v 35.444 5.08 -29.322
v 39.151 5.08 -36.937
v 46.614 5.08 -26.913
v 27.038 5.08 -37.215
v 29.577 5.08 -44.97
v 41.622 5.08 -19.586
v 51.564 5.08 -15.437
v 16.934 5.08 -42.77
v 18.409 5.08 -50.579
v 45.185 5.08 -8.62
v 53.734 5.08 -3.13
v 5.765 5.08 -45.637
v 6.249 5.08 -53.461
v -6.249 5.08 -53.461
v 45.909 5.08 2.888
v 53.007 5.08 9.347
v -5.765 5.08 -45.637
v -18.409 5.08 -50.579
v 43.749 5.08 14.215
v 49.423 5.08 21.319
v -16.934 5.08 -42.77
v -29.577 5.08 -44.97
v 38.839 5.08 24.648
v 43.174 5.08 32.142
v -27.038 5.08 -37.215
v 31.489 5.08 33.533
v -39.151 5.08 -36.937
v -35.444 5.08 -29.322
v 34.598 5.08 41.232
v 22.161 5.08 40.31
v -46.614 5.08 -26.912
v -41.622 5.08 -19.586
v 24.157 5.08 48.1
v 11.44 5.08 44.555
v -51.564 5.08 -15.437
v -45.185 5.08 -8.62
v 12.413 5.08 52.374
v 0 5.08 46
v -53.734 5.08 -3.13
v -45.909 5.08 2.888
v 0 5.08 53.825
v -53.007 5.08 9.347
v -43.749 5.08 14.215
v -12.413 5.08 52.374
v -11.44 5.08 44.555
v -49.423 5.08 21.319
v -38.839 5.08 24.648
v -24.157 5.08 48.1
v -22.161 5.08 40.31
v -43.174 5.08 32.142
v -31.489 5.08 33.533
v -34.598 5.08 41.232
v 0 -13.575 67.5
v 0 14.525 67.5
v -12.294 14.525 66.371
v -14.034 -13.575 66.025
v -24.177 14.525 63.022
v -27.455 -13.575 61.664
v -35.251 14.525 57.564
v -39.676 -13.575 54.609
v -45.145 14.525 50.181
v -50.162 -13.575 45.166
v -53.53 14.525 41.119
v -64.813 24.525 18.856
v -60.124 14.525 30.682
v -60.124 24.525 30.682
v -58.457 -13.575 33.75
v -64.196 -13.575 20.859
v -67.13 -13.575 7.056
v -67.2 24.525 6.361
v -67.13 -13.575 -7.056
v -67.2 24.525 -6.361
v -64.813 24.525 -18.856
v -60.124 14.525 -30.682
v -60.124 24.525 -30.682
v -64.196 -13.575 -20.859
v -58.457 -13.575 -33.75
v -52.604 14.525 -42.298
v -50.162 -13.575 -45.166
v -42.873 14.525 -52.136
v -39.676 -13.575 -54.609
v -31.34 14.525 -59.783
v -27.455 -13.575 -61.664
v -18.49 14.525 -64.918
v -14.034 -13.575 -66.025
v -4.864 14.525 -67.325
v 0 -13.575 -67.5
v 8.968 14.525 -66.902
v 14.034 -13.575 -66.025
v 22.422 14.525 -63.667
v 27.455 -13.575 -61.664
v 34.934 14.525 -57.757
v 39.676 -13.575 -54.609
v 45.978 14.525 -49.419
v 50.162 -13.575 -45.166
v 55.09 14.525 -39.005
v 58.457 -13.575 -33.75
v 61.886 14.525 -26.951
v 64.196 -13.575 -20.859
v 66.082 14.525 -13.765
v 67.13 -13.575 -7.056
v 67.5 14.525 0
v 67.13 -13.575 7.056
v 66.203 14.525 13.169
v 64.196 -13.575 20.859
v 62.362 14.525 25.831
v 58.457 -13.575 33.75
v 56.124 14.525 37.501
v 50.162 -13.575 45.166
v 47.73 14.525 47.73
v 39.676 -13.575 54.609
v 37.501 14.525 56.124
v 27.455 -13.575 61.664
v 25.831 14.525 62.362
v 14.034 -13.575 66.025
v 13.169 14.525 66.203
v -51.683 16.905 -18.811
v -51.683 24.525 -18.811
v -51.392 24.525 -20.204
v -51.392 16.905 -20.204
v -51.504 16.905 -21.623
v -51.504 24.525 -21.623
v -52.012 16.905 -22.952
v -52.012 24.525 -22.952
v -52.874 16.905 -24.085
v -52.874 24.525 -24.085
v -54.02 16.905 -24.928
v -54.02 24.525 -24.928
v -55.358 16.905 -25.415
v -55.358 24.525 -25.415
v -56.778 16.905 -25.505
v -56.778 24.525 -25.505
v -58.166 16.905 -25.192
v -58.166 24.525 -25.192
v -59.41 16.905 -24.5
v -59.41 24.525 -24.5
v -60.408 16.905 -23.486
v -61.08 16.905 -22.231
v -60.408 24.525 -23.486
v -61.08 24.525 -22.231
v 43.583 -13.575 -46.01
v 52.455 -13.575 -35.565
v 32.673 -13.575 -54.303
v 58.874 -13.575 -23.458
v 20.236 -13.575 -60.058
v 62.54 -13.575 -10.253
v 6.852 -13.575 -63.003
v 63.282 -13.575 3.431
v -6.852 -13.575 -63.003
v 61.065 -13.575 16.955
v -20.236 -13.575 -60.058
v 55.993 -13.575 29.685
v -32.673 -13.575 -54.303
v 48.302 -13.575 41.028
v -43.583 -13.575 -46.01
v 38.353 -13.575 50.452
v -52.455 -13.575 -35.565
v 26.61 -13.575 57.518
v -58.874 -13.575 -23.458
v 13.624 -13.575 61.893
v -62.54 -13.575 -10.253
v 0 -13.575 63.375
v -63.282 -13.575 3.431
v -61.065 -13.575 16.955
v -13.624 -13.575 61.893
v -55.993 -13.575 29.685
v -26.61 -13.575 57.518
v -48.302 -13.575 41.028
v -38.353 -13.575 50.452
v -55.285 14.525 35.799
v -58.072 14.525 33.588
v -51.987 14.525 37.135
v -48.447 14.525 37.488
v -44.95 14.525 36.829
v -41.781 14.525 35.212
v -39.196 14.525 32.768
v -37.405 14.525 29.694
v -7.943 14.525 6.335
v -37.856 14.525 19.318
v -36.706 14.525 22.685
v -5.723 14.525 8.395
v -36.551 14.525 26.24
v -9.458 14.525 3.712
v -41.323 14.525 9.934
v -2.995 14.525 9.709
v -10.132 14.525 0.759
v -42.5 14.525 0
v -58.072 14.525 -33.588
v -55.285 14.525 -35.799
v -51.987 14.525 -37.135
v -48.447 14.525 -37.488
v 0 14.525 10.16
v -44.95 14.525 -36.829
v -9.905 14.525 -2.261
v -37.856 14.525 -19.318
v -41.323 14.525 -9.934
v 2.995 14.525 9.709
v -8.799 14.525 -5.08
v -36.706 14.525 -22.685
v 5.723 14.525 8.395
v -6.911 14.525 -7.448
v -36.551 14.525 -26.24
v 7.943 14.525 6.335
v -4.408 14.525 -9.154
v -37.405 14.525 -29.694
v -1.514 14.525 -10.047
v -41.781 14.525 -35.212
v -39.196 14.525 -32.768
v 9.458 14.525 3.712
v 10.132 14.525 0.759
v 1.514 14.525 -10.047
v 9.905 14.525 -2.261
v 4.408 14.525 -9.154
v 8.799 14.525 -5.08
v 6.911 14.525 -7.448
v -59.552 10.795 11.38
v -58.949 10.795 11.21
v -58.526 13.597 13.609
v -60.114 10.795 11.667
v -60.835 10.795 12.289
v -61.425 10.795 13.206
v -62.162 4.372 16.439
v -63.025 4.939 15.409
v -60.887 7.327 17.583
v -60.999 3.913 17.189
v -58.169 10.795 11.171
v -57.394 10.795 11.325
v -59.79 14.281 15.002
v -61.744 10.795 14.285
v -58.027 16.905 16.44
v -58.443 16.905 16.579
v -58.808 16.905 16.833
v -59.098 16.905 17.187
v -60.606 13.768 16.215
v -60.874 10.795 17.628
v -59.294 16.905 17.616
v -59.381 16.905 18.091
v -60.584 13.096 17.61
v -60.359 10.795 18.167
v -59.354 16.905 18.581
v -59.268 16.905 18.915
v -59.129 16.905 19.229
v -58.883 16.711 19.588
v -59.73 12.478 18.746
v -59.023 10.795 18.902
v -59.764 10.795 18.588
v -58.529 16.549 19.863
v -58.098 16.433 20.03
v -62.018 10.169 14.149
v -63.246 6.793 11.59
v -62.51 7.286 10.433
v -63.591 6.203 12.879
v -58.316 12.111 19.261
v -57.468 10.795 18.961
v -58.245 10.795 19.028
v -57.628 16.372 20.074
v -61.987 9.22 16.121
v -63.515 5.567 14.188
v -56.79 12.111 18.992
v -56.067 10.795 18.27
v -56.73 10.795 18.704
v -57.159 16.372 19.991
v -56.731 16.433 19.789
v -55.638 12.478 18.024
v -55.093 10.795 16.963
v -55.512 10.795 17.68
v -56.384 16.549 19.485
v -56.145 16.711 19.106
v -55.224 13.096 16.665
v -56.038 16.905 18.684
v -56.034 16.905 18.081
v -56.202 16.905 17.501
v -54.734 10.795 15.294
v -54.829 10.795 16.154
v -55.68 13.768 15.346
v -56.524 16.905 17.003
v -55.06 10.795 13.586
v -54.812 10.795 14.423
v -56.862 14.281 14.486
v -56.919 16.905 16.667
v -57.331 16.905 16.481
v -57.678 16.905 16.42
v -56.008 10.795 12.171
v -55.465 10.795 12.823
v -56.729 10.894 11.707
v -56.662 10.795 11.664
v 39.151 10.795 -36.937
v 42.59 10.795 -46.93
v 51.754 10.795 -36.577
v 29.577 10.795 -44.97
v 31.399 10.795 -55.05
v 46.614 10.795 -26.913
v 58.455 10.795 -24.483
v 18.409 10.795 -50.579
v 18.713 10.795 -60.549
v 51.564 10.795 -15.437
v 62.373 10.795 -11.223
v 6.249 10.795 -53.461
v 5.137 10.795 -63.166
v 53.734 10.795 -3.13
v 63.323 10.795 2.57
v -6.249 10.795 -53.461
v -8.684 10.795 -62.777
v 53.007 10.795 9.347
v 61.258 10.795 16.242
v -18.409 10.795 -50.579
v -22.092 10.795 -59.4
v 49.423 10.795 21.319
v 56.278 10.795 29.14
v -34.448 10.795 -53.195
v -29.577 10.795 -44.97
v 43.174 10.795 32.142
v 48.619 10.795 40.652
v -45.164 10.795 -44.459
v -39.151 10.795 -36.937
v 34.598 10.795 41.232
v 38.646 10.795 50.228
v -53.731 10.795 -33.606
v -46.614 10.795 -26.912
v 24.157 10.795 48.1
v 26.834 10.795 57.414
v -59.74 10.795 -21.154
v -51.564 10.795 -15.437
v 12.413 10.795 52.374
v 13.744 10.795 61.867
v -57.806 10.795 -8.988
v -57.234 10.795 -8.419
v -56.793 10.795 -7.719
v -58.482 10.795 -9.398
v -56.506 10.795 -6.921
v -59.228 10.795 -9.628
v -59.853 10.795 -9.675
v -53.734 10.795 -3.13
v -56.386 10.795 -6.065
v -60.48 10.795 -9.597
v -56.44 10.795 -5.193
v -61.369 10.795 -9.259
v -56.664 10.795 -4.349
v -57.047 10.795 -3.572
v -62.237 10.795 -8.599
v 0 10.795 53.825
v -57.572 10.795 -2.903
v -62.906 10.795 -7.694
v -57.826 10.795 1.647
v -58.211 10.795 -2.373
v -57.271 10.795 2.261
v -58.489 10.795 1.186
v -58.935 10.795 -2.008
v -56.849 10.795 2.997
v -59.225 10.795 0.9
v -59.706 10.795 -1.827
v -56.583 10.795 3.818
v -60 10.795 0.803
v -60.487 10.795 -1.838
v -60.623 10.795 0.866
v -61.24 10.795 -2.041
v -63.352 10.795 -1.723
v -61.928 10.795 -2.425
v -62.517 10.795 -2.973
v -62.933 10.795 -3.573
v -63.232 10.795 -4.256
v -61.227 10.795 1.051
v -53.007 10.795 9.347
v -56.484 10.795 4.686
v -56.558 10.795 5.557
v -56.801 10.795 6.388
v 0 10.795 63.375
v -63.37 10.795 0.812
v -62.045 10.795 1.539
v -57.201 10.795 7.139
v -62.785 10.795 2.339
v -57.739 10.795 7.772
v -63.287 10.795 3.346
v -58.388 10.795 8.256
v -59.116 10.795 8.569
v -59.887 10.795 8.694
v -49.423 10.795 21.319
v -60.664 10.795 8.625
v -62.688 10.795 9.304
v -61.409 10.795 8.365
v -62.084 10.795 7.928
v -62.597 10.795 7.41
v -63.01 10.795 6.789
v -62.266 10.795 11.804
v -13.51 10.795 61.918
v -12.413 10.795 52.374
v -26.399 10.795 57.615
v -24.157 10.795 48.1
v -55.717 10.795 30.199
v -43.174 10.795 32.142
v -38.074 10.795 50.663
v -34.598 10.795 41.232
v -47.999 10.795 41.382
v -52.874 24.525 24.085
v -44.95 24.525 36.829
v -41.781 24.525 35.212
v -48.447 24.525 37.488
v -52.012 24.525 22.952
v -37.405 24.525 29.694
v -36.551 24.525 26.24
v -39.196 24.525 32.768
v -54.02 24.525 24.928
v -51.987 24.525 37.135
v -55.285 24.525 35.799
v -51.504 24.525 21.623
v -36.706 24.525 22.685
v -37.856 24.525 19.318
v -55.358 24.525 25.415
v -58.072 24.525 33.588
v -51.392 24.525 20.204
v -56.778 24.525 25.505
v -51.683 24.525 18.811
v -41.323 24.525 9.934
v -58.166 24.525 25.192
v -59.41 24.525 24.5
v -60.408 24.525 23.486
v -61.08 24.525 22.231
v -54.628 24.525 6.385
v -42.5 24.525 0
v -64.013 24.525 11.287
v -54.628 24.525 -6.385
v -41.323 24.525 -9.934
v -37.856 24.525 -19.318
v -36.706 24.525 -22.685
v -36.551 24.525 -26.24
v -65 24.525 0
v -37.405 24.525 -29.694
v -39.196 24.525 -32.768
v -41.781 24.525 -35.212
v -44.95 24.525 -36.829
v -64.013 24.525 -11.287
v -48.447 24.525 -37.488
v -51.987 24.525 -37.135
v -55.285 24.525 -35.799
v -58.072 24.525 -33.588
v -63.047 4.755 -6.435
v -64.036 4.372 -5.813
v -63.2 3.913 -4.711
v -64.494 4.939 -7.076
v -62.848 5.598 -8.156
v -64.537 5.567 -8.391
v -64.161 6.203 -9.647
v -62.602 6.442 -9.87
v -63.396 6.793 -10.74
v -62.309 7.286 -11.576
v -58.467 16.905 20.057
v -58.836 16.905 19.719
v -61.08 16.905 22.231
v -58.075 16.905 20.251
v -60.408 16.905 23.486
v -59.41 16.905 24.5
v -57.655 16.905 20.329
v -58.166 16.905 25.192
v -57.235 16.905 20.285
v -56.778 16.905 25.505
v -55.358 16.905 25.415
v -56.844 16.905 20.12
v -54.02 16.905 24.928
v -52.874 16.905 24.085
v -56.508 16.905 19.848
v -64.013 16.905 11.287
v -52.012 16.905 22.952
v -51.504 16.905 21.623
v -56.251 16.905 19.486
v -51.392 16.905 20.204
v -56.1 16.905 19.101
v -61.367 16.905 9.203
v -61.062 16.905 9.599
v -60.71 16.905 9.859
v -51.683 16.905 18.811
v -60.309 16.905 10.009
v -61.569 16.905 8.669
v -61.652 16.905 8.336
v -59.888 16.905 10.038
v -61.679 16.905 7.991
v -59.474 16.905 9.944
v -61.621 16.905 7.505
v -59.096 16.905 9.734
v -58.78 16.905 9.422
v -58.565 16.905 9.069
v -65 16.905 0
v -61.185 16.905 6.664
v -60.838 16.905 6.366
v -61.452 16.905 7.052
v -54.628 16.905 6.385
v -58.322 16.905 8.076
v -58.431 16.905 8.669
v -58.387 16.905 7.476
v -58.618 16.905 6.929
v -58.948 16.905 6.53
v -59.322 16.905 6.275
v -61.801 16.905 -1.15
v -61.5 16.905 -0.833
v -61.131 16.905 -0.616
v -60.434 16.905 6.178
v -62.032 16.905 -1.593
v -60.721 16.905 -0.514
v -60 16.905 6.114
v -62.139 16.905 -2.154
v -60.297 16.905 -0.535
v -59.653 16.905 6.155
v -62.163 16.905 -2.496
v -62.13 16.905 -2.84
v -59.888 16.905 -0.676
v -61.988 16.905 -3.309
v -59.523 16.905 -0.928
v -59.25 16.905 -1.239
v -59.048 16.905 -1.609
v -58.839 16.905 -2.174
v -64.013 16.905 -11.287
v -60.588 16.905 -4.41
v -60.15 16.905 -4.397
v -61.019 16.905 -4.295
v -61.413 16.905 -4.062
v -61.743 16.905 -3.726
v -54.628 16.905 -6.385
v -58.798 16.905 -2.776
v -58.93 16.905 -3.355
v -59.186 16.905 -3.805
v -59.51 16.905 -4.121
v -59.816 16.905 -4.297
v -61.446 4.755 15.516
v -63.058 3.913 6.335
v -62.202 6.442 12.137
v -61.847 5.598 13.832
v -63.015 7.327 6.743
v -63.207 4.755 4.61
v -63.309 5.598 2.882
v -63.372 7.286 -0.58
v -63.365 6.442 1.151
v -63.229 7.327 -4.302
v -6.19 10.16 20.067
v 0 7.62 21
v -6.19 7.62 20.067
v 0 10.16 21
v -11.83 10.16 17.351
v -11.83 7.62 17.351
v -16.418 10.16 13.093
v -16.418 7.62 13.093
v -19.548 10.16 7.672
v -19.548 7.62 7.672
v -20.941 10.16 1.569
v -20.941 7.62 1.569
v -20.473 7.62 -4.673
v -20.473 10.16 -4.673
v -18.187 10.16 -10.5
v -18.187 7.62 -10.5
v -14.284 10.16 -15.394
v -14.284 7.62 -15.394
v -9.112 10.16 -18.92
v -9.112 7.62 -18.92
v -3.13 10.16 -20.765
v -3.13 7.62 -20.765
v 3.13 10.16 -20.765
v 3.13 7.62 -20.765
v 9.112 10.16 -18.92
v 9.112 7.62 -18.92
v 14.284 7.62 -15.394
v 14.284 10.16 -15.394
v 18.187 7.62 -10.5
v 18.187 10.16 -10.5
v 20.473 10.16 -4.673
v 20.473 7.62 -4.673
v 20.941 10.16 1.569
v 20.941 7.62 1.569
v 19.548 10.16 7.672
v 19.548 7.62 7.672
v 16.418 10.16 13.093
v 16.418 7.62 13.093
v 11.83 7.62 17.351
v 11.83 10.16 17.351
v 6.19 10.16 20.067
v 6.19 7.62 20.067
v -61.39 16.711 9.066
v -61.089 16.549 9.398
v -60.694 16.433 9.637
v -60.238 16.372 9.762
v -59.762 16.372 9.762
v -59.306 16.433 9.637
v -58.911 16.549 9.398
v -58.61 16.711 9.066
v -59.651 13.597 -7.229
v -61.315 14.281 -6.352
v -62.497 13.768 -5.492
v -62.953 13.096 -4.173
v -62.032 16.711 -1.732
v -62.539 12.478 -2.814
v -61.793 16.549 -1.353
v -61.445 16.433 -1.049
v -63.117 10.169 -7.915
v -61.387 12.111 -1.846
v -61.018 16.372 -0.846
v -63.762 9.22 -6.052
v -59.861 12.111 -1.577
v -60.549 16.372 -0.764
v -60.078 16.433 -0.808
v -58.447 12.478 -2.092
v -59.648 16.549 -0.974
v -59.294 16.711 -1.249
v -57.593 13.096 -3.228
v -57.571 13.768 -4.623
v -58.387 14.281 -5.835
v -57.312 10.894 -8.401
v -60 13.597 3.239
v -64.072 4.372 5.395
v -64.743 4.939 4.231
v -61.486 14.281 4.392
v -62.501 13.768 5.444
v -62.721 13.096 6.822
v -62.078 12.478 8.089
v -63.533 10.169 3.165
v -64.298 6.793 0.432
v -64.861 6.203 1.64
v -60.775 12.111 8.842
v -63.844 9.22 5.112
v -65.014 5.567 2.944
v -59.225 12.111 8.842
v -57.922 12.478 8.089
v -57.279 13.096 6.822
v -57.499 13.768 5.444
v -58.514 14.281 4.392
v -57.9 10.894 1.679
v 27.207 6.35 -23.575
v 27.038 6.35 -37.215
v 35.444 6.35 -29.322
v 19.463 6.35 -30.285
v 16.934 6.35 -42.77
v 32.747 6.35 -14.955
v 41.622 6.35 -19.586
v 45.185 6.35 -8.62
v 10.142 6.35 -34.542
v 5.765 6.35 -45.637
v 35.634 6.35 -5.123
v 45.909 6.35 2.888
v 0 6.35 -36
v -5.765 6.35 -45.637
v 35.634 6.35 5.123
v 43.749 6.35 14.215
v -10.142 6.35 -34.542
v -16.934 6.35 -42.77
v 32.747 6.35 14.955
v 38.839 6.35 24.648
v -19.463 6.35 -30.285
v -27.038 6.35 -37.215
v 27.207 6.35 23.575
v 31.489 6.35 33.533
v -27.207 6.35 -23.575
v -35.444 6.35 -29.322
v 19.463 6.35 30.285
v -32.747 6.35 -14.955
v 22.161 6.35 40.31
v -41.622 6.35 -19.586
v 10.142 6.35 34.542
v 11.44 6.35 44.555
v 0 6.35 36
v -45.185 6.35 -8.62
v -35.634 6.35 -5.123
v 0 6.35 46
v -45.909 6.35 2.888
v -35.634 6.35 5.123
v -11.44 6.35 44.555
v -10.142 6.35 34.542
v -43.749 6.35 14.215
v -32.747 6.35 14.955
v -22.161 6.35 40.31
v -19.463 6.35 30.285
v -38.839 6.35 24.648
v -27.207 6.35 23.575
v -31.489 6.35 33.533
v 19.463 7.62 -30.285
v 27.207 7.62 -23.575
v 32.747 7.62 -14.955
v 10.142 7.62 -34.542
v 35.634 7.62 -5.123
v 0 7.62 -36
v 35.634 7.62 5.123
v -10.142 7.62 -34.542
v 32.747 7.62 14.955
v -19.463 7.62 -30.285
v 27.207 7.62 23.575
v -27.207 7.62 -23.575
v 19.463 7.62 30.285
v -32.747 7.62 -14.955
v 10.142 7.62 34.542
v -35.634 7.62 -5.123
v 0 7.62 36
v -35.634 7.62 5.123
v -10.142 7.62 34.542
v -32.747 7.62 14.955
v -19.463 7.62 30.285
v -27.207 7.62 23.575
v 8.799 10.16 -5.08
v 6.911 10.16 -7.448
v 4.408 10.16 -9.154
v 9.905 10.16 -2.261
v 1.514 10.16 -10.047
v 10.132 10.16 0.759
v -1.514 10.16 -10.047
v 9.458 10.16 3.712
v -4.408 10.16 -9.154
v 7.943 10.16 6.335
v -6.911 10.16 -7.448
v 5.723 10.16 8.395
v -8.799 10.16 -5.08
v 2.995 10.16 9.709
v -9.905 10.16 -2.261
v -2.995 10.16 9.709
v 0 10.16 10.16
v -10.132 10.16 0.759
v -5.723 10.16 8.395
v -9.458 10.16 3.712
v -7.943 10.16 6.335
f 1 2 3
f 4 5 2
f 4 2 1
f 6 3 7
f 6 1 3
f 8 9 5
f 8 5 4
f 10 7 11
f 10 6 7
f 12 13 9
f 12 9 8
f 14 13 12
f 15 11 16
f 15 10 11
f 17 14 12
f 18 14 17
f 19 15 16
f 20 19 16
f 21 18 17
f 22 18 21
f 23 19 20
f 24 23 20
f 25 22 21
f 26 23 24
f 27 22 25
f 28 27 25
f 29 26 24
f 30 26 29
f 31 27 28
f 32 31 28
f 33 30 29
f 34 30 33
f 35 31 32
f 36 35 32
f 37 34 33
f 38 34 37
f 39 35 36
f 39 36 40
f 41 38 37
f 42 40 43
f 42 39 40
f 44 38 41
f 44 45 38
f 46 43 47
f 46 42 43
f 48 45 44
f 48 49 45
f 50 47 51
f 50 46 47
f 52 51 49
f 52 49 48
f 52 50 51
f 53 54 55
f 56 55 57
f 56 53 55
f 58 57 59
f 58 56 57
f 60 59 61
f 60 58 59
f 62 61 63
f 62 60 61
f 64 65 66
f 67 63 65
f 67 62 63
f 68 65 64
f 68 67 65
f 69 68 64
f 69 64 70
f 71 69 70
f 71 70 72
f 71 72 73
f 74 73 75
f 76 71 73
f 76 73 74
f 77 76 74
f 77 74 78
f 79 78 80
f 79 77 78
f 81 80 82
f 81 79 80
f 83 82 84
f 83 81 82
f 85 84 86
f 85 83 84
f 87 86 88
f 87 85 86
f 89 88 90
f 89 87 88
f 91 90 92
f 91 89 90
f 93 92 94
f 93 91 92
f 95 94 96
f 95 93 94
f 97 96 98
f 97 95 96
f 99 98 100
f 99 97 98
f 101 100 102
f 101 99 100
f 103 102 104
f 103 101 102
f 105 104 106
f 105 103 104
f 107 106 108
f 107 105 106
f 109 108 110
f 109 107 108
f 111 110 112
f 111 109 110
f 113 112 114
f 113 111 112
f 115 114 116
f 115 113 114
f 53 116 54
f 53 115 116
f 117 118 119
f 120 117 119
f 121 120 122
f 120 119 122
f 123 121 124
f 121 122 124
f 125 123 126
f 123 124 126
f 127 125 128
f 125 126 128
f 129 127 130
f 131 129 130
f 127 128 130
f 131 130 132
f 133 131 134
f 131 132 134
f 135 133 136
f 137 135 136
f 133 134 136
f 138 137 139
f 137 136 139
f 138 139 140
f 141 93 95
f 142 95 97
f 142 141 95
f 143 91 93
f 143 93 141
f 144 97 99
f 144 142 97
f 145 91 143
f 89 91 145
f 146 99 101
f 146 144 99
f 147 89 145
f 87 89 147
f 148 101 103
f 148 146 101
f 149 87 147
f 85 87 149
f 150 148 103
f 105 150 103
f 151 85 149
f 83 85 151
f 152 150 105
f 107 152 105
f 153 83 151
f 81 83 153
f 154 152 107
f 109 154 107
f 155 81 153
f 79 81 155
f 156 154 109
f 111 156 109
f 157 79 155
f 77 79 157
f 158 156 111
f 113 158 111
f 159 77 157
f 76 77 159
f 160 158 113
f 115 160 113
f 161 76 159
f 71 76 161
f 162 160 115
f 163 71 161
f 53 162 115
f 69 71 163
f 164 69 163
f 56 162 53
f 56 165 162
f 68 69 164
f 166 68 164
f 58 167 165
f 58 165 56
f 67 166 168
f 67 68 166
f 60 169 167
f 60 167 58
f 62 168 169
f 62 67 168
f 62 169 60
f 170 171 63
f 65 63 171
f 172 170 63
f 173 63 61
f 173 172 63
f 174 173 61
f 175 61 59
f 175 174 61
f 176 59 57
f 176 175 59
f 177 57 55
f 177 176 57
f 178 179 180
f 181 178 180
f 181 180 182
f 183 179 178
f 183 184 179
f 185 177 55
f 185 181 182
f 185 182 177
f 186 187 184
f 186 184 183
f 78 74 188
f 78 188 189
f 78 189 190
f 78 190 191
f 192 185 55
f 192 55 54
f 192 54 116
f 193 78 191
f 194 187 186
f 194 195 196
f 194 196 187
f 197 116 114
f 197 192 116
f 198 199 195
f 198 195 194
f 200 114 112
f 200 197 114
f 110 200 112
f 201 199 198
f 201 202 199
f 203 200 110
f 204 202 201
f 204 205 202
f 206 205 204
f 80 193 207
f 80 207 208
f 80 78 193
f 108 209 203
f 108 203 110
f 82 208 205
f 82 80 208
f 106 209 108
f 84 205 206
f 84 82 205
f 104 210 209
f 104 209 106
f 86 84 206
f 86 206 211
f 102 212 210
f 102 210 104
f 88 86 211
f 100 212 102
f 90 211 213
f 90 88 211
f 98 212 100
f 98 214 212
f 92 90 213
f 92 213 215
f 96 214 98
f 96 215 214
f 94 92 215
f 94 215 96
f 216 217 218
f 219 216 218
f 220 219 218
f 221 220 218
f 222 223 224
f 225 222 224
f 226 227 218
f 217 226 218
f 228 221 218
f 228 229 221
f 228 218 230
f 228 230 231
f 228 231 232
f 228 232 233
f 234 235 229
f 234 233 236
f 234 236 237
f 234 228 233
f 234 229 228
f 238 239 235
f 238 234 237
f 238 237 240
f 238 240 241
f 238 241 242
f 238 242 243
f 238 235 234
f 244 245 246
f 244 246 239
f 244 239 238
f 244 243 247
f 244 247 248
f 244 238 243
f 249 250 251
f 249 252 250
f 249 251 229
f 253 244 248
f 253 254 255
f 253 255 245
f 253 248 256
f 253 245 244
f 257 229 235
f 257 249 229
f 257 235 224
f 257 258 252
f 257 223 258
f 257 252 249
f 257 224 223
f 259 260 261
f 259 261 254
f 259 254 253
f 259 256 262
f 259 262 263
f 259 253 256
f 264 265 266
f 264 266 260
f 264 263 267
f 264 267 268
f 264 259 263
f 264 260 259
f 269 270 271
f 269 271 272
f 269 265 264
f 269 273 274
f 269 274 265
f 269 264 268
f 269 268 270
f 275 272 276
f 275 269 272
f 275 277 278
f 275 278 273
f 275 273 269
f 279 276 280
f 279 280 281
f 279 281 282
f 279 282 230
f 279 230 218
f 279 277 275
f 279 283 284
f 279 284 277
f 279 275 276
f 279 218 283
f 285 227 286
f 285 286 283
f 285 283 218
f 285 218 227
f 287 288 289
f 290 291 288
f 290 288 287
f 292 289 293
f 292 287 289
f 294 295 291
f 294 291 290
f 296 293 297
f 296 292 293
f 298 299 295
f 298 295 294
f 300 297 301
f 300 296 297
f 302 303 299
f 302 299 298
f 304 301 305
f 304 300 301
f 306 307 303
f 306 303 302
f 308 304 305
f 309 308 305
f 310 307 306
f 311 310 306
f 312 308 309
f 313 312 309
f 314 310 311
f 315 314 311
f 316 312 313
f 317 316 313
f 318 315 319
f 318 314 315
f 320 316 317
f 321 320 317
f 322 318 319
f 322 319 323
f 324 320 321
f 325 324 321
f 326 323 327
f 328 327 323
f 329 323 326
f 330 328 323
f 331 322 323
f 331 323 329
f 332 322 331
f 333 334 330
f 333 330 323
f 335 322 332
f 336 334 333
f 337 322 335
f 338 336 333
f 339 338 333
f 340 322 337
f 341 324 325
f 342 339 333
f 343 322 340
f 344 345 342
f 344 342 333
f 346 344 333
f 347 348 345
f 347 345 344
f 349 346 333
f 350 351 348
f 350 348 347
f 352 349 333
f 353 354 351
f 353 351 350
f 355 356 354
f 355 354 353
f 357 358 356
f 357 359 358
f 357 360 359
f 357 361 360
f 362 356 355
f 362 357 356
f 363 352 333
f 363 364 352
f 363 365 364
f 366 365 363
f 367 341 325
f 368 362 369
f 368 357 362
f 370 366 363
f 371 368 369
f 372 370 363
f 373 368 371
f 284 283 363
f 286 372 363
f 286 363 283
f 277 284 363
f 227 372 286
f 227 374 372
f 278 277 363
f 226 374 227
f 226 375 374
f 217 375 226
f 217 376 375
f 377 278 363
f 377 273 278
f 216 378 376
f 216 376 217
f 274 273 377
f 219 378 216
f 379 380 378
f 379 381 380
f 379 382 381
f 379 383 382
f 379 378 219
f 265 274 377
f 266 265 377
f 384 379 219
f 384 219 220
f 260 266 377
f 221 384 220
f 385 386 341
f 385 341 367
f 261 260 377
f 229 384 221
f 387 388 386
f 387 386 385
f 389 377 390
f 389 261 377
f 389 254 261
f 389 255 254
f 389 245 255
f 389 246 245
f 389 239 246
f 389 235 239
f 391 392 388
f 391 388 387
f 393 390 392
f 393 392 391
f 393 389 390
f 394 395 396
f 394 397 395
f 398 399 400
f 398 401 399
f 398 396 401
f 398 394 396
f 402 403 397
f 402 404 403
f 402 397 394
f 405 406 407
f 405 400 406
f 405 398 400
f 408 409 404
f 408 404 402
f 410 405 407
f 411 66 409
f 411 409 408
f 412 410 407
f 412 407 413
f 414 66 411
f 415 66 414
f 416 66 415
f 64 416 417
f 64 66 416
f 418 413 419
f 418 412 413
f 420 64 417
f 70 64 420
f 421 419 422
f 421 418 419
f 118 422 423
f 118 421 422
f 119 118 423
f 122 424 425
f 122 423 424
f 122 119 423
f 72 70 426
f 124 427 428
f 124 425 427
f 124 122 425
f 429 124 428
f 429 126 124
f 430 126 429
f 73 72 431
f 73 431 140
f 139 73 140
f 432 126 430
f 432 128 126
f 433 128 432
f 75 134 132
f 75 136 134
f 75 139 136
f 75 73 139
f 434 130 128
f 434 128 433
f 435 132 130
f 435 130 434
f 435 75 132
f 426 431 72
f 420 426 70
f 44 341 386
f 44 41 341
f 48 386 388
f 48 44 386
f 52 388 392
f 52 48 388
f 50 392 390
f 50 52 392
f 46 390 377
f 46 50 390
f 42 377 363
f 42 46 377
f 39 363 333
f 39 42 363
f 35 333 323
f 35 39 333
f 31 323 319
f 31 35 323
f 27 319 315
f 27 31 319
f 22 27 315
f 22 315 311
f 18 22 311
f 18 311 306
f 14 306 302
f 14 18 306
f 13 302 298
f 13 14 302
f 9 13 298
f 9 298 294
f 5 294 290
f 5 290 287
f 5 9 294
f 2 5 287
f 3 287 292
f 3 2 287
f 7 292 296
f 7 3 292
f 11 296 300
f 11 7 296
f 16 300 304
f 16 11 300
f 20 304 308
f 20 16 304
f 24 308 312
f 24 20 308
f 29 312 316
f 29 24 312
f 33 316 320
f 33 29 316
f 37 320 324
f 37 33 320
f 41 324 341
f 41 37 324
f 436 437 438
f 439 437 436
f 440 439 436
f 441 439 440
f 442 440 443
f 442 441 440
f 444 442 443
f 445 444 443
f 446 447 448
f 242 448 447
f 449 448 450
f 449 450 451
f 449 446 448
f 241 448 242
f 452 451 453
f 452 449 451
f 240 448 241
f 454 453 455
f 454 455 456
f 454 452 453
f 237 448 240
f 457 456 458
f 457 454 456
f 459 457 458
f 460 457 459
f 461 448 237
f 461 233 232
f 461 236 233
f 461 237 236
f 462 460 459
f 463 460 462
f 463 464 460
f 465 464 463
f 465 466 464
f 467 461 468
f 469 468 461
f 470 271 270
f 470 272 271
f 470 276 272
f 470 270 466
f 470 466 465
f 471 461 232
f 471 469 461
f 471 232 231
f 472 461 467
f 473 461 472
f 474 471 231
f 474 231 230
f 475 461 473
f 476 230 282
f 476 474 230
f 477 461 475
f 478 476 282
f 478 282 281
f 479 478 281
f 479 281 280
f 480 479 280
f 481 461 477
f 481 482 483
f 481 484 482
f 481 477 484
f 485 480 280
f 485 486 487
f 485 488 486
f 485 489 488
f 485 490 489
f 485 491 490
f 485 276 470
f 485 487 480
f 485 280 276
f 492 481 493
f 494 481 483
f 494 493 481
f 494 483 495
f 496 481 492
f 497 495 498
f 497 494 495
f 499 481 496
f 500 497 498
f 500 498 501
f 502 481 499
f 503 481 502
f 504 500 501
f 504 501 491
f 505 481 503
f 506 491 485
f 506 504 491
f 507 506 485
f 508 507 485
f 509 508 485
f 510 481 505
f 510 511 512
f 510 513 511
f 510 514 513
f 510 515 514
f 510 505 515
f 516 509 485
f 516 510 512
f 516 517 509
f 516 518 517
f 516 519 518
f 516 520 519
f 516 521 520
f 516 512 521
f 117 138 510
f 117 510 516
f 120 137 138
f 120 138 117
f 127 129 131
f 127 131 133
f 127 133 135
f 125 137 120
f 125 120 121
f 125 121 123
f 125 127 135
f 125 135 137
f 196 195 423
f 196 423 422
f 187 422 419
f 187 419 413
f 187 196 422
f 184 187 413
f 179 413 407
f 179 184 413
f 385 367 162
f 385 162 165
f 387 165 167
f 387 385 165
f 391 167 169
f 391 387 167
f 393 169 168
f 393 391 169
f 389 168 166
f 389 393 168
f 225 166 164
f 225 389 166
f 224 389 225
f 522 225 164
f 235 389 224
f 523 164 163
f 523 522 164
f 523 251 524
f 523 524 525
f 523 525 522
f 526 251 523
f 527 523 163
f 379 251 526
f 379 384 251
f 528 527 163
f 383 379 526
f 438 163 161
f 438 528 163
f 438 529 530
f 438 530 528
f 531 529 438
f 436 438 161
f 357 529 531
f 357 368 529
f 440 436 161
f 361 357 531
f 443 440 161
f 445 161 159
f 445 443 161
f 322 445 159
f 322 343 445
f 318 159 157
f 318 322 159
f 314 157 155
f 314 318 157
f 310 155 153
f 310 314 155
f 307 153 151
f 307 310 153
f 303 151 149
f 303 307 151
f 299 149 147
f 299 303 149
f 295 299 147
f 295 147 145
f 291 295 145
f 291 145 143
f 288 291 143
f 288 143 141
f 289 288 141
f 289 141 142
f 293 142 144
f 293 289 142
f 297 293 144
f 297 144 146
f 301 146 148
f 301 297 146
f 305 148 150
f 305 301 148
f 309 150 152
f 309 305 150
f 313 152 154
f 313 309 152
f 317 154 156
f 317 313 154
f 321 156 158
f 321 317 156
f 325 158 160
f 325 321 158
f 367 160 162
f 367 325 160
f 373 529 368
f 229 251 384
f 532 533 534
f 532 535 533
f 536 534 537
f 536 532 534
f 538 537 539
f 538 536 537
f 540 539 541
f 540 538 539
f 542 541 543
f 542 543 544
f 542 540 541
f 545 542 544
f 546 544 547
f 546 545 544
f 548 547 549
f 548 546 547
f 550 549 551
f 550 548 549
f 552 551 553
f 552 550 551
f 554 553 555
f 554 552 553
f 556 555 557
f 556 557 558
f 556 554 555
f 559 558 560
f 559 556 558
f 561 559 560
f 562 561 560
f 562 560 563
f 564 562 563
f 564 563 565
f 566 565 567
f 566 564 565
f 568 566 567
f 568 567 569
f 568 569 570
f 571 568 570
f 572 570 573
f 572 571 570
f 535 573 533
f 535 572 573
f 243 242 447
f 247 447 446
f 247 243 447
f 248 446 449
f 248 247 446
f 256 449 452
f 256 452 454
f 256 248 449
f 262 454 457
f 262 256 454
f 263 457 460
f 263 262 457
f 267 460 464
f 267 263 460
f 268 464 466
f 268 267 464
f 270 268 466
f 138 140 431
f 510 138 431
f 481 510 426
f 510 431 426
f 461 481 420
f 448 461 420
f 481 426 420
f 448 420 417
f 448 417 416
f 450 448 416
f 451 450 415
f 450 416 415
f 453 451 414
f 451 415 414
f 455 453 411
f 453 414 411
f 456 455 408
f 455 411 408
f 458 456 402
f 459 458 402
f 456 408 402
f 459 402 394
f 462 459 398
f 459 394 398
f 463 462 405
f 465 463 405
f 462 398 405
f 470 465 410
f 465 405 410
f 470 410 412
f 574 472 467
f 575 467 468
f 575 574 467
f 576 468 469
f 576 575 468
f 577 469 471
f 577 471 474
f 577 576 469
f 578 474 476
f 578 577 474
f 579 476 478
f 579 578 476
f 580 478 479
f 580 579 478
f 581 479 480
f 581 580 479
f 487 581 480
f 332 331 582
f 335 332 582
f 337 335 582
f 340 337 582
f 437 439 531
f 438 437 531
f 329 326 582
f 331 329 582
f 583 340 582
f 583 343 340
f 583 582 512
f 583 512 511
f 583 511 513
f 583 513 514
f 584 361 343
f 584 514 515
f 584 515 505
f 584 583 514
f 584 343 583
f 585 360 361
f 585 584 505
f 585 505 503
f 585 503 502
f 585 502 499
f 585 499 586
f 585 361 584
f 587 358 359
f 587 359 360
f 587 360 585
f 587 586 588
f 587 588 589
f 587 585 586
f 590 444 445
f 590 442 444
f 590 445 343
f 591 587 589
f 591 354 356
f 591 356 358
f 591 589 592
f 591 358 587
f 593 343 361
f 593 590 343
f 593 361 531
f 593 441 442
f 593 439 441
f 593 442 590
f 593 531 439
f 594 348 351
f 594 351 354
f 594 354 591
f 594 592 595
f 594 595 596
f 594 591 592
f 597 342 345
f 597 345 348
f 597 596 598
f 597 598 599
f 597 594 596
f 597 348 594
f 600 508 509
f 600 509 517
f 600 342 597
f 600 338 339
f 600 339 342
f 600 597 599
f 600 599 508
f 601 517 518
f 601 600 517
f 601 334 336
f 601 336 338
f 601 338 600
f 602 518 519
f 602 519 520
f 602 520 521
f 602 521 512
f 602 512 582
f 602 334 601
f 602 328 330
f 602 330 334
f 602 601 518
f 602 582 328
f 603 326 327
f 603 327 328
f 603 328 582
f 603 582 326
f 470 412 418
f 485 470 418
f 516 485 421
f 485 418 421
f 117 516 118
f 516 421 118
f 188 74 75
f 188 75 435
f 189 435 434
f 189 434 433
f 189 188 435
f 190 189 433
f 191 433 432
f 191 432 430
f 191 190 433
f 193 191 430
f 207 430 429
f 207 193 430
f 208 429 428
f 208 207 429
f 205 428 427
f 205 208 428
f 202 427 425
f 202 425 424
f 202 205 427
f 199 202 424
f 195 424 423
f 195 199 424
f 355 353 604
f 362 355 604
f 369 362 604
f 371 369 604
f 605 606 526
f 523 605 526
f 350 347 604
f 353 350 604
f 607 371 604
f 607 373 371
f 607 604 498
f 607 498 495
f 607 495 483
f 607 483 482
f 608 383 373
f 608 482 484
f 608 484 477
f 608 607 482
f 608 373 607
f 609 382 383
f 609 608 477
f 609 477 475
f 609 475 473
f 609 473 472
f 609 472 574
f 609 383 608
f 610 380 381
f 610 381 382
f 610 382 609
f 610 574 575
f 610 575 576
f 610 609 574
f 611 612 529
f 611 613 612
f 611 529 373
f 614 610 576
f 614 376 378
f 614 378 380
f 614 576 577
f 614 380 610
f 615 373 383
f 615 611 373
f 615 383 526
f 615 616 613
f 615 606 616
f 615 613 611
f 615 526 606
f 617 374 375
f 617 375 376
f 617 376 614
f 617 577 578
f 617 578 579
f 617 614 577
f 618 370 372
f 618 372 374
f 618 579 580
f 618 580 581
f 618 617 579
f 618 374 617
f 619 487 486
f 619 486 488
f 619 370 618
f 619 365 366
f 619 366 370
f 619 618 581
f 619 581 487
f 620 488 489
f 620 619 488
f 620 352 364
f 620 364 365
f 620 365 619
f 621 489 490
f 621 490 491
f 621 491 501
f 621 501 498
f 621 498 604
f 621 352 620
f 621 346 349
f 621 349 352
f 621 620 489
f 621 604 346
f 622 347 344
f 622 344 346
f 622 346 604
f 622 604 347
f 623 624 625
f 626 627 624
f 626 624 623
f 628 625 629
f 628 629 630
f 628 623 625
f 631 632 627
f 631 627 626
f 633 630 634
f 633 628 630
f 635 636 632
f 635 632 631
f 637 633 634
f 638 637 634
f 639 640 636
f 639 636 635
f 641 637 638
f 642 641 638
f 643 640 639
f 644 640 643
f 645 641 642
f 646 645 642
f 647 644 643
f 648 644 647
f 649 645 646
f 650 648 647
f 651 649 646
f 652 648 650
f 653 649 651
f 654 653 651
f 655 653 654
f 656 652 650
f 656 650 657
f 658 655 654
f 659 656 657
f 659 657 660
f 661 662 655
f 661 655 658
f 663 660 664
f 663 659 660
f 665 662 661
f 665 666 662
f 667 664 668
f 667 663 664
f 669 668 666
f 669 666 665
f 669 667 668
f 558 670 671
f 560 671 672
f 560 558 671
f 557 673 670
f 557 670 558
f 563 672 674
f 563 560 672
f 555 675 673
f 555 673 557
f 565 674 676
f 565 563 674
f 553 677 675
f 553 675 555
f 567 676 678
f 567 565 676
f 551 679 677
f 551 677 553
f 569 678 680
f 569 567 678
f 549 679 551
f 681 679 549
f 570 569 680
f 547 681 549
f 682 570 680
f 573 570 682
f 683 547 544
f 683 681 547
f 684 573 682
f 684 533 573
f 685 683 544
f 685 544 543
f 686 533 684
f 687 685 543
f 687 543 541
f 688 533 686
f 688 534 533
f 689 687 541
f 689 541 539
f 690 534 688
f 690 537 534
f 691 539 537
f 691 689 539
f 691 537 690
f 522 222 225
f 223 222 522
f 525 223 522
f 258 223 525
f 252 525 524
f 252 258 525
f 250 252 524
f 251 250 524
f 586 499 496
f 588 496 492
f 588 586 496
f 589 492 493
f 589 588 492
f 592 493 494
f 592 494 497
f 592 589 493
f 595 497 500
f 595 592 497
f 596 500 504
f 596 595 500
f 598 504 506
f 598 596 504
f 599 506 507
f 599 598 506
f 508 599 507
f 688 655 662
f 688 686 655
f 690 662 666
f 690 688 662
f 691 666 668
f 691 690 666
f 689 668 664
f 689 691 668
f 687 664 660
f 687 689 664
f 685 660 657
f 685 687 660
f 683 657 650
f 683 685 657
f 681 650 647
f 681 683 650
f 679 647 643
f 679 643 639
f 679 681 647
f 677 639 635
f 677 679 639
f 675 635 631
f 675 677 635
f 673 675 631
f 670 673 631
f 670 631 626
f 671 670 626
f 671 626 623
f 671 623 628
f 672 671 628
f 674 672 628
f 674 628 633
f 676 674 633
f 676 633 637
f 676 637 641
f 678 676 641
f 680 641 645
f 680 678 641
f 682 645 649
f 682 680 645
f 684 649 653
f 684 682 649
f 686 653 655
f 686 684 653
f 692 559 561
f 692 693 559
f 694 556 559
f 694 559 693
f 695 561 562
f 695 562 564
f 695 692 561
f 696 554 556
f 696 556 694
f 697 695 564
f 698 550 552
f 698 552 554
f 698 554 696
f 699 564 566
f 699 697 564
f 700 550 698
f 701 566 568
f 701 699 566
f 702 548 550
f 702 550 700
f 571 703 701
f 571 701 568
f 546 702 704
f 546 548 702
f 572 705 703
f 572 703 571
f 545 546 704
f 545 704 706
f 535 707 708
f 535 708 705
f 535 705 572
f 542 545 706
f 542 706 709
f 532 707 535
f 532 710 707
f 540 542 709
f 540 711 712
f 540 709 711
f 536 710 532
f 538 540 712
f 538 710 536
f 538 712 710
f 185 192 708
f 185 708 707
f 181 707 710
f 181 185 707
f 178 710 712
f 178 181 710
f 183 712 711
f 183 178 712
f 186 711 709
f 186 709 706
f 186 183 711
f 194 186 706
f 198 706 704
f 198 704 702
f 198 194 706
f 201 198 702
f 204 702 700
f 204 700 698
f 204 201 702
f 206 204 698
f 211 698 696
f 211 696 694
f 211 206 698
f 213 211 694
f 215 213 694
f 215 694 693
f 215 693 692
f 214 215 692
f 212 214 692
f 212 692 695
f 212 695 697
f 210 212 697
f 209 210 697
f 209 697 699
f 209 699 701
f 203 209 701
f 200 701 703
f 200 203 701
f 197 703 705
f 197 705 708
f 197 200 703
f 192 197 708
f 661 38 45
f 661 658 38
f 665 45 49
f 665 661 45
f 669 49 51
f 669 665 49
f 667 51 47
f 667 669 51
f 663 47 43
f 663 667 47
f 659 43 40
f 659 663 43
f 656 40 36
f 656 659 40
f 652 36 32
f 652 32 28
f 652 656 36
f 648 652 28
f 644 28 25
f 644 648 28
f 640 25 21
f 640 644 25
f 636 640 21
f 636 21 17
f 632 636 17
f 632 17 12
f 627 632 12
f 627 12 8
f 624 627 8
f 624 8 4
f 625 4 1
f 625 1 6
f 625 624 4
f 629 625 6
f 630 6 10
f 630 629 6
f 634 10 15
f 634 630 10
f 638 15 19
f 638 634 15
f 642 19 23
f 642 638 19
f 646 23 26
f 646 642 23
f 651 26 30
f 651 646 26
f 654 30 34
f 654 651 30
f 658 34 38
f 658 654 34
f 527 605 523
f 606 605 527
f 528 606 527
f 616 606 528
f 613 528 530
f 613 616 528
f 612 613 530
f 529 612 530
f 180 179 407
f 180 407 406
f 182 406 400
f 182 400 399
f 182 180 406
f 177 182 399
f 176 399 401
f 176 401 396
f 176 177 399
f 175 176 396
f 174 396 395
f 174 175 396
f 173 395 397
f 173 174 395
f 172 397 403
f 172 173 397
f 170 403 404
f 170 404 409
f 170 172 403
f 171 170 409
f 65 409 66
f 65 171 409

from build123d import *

# Parameters (mm, degrees)
GEAR_START                      = -10
SKETCH1_R                       = 10.16
GEAR_SLOT_DEPTH                 = 10
CIRPATTERN1_COUNT               = 2
CIRPATTERN1_ANGLE               = 10
CIRPATTERN1_THE_OTHER_WAY_COUNT = 2
CIRPATTERN1_THE_OTHER_WAY_ANGLE = 10
GAS_MANIFOLD_DEPTH              = 7.62


with BuildPart() as part:
    # Sketch9 → Revolve1 (revolve)
    with BuildSketch(Plane.XY, mode=Mode.PRIVATE) as revolve1_sk:
        Polygon((-10.16, 10.16), (-10.16, 24.525), (-67.5, 24.525), (-67.5, -13.575), (-63.375, -13.575), (-63.375, 10.795), (-53.825, 10.795), (-53.825, 5.08), (-46, 5.08), (-46, 6.35), (-36, 6.35), (-36, 7.62), (-21, 7.62), (-21, 10.16), align=None)
    revolve(revolve1_sk.sketch.rotate(Axis((0, 18.1216542, 0), (0, -1, 0)), 270), axis=Axis((0, 18.1216542, 0), (0, -1, 0)))

    # Sketch1 → Gear Slot (cut)
    with BuildSketch(Plane(origin=(0, 24.525, 0), x_dir=(1, 0, 0), z_dir=(0, 1, 0)).offset(GEAR_START)):
        with BuildLine():
            ThreePointArc((-60.123839141, -30.681818182), (15.778004595, -65.630058441), (67.5, 0))
            ThreePointArc((67.5, 0), (15.778004595, 65.630058441), (-60.123839141, 30.681818182))
            ThreePointArc((-60.123839141, 30.681818182), (-43.307976674, 36.134044285), (-37.85575057, 19.318181818))
            ThreePointArc((-37.85575057, 19.318181818), (-42.5, 0), (-37.85575057, -19.318181818))
            ThreePointArc((-37.85575057, -19.318181818), (-43.307976674, -36.134044285), (-60.123839141, -30.681818182))
        make_face()
        with Locations(Location((0, 0, 0), (0, 0, 270))):
            Circle(SKETCH1_R, mode=Mode.SUBTRACT)
    extrude(amount=GEAR_SLOT_DEPTH, mode=Mode.SUBTRACT)

    # Sketch5 one side → Orifice (revolve, cut)
    with BuildSketch(Plane(origin=(-60, 0, 0), x_dir=(0, 0, -1), z_dir=(1, 0, 0)), mode=Mode.PRIVATE) as orifice_sk:
        Polygon((-9.77813806, 16.364061196), (-7.26937996, 3.457619634), (-2.759272111, 5.65734621), (-10.553511101, 21.637904353), (-12.005063486, 20.929934951), align=None)
    orifice = revolve(orifice_sk.sketch.rotate(Axis((-60, 5.65734621, 2.759272111), (0, 0.8987940462991696, 0.43837114678907213)), 180), axis=Axis((-60, 5.65734621, 2.759272111), (0, 0.8987940462991696, 0.43837114678907213)), mode=Mode.SUBTRACT)

    # CirPattern1: Orifice ×2 about axis
    cirpattern1_axis = Axis((0, 17.78, 0), (0, -1, 0))
    for i in range(1, CIRPATTERN1_COUNT):
        add(orifice.rotate(cirpattern1_axis, i * CIRPATTERN1_ANGLE / (CIRPATTERN1_COUNT - 1)), mode=Mode.SUBTRACT)

    # CirPattern1 the other way: Orifice ×2 about axis
    cirpattern1_the_other_way_axis = Axis((0, 17.78, 0), (0, 1, 0))
    for i in range(1, CIRPATTERN1_THE_OTHER_WAY_COUNT):
        add(orifice.rotate(cirpattern1_the_other_way_axis, i * CIRPATTERN1_THE_OTHER_WAY_ANGLE / (CIRPATTERN1_THE_OTHER_WAY_COUNT - 1)), mode=Mode.SUBTRACT)

    # Sketch10 → Gas Manifold (cut)
    with BuildSketch(Plane(origin=(0, 24.525, 0), x_dir=(1, 0, 0), z_dir=(0, 1, 0))):
        with BuildLine():
            ThreePointArc((-51.683094143, -18.811107883), (-55, 0), (-51.683094143, 18.811107883))
            ThreePointArc((-51.683094143, 18.811107883), (-54.671456531, 25.219671703), (-61.080020351, 22.231309316))
            ThreePointArc((-61.080020351, 22.231309316), (-65, 0), (-61.080020351, -22.231309316))
            ThreePointArc((-61.080020351, -22.231309316), (-54.671456531, -25.219671703), (-51.683094143, -18.811107883))
        make_face()
    extrude(amount=-GAS_MANIFOLD_DEPTH, mode=Mode.SUBTRACT)


solid = part.part
